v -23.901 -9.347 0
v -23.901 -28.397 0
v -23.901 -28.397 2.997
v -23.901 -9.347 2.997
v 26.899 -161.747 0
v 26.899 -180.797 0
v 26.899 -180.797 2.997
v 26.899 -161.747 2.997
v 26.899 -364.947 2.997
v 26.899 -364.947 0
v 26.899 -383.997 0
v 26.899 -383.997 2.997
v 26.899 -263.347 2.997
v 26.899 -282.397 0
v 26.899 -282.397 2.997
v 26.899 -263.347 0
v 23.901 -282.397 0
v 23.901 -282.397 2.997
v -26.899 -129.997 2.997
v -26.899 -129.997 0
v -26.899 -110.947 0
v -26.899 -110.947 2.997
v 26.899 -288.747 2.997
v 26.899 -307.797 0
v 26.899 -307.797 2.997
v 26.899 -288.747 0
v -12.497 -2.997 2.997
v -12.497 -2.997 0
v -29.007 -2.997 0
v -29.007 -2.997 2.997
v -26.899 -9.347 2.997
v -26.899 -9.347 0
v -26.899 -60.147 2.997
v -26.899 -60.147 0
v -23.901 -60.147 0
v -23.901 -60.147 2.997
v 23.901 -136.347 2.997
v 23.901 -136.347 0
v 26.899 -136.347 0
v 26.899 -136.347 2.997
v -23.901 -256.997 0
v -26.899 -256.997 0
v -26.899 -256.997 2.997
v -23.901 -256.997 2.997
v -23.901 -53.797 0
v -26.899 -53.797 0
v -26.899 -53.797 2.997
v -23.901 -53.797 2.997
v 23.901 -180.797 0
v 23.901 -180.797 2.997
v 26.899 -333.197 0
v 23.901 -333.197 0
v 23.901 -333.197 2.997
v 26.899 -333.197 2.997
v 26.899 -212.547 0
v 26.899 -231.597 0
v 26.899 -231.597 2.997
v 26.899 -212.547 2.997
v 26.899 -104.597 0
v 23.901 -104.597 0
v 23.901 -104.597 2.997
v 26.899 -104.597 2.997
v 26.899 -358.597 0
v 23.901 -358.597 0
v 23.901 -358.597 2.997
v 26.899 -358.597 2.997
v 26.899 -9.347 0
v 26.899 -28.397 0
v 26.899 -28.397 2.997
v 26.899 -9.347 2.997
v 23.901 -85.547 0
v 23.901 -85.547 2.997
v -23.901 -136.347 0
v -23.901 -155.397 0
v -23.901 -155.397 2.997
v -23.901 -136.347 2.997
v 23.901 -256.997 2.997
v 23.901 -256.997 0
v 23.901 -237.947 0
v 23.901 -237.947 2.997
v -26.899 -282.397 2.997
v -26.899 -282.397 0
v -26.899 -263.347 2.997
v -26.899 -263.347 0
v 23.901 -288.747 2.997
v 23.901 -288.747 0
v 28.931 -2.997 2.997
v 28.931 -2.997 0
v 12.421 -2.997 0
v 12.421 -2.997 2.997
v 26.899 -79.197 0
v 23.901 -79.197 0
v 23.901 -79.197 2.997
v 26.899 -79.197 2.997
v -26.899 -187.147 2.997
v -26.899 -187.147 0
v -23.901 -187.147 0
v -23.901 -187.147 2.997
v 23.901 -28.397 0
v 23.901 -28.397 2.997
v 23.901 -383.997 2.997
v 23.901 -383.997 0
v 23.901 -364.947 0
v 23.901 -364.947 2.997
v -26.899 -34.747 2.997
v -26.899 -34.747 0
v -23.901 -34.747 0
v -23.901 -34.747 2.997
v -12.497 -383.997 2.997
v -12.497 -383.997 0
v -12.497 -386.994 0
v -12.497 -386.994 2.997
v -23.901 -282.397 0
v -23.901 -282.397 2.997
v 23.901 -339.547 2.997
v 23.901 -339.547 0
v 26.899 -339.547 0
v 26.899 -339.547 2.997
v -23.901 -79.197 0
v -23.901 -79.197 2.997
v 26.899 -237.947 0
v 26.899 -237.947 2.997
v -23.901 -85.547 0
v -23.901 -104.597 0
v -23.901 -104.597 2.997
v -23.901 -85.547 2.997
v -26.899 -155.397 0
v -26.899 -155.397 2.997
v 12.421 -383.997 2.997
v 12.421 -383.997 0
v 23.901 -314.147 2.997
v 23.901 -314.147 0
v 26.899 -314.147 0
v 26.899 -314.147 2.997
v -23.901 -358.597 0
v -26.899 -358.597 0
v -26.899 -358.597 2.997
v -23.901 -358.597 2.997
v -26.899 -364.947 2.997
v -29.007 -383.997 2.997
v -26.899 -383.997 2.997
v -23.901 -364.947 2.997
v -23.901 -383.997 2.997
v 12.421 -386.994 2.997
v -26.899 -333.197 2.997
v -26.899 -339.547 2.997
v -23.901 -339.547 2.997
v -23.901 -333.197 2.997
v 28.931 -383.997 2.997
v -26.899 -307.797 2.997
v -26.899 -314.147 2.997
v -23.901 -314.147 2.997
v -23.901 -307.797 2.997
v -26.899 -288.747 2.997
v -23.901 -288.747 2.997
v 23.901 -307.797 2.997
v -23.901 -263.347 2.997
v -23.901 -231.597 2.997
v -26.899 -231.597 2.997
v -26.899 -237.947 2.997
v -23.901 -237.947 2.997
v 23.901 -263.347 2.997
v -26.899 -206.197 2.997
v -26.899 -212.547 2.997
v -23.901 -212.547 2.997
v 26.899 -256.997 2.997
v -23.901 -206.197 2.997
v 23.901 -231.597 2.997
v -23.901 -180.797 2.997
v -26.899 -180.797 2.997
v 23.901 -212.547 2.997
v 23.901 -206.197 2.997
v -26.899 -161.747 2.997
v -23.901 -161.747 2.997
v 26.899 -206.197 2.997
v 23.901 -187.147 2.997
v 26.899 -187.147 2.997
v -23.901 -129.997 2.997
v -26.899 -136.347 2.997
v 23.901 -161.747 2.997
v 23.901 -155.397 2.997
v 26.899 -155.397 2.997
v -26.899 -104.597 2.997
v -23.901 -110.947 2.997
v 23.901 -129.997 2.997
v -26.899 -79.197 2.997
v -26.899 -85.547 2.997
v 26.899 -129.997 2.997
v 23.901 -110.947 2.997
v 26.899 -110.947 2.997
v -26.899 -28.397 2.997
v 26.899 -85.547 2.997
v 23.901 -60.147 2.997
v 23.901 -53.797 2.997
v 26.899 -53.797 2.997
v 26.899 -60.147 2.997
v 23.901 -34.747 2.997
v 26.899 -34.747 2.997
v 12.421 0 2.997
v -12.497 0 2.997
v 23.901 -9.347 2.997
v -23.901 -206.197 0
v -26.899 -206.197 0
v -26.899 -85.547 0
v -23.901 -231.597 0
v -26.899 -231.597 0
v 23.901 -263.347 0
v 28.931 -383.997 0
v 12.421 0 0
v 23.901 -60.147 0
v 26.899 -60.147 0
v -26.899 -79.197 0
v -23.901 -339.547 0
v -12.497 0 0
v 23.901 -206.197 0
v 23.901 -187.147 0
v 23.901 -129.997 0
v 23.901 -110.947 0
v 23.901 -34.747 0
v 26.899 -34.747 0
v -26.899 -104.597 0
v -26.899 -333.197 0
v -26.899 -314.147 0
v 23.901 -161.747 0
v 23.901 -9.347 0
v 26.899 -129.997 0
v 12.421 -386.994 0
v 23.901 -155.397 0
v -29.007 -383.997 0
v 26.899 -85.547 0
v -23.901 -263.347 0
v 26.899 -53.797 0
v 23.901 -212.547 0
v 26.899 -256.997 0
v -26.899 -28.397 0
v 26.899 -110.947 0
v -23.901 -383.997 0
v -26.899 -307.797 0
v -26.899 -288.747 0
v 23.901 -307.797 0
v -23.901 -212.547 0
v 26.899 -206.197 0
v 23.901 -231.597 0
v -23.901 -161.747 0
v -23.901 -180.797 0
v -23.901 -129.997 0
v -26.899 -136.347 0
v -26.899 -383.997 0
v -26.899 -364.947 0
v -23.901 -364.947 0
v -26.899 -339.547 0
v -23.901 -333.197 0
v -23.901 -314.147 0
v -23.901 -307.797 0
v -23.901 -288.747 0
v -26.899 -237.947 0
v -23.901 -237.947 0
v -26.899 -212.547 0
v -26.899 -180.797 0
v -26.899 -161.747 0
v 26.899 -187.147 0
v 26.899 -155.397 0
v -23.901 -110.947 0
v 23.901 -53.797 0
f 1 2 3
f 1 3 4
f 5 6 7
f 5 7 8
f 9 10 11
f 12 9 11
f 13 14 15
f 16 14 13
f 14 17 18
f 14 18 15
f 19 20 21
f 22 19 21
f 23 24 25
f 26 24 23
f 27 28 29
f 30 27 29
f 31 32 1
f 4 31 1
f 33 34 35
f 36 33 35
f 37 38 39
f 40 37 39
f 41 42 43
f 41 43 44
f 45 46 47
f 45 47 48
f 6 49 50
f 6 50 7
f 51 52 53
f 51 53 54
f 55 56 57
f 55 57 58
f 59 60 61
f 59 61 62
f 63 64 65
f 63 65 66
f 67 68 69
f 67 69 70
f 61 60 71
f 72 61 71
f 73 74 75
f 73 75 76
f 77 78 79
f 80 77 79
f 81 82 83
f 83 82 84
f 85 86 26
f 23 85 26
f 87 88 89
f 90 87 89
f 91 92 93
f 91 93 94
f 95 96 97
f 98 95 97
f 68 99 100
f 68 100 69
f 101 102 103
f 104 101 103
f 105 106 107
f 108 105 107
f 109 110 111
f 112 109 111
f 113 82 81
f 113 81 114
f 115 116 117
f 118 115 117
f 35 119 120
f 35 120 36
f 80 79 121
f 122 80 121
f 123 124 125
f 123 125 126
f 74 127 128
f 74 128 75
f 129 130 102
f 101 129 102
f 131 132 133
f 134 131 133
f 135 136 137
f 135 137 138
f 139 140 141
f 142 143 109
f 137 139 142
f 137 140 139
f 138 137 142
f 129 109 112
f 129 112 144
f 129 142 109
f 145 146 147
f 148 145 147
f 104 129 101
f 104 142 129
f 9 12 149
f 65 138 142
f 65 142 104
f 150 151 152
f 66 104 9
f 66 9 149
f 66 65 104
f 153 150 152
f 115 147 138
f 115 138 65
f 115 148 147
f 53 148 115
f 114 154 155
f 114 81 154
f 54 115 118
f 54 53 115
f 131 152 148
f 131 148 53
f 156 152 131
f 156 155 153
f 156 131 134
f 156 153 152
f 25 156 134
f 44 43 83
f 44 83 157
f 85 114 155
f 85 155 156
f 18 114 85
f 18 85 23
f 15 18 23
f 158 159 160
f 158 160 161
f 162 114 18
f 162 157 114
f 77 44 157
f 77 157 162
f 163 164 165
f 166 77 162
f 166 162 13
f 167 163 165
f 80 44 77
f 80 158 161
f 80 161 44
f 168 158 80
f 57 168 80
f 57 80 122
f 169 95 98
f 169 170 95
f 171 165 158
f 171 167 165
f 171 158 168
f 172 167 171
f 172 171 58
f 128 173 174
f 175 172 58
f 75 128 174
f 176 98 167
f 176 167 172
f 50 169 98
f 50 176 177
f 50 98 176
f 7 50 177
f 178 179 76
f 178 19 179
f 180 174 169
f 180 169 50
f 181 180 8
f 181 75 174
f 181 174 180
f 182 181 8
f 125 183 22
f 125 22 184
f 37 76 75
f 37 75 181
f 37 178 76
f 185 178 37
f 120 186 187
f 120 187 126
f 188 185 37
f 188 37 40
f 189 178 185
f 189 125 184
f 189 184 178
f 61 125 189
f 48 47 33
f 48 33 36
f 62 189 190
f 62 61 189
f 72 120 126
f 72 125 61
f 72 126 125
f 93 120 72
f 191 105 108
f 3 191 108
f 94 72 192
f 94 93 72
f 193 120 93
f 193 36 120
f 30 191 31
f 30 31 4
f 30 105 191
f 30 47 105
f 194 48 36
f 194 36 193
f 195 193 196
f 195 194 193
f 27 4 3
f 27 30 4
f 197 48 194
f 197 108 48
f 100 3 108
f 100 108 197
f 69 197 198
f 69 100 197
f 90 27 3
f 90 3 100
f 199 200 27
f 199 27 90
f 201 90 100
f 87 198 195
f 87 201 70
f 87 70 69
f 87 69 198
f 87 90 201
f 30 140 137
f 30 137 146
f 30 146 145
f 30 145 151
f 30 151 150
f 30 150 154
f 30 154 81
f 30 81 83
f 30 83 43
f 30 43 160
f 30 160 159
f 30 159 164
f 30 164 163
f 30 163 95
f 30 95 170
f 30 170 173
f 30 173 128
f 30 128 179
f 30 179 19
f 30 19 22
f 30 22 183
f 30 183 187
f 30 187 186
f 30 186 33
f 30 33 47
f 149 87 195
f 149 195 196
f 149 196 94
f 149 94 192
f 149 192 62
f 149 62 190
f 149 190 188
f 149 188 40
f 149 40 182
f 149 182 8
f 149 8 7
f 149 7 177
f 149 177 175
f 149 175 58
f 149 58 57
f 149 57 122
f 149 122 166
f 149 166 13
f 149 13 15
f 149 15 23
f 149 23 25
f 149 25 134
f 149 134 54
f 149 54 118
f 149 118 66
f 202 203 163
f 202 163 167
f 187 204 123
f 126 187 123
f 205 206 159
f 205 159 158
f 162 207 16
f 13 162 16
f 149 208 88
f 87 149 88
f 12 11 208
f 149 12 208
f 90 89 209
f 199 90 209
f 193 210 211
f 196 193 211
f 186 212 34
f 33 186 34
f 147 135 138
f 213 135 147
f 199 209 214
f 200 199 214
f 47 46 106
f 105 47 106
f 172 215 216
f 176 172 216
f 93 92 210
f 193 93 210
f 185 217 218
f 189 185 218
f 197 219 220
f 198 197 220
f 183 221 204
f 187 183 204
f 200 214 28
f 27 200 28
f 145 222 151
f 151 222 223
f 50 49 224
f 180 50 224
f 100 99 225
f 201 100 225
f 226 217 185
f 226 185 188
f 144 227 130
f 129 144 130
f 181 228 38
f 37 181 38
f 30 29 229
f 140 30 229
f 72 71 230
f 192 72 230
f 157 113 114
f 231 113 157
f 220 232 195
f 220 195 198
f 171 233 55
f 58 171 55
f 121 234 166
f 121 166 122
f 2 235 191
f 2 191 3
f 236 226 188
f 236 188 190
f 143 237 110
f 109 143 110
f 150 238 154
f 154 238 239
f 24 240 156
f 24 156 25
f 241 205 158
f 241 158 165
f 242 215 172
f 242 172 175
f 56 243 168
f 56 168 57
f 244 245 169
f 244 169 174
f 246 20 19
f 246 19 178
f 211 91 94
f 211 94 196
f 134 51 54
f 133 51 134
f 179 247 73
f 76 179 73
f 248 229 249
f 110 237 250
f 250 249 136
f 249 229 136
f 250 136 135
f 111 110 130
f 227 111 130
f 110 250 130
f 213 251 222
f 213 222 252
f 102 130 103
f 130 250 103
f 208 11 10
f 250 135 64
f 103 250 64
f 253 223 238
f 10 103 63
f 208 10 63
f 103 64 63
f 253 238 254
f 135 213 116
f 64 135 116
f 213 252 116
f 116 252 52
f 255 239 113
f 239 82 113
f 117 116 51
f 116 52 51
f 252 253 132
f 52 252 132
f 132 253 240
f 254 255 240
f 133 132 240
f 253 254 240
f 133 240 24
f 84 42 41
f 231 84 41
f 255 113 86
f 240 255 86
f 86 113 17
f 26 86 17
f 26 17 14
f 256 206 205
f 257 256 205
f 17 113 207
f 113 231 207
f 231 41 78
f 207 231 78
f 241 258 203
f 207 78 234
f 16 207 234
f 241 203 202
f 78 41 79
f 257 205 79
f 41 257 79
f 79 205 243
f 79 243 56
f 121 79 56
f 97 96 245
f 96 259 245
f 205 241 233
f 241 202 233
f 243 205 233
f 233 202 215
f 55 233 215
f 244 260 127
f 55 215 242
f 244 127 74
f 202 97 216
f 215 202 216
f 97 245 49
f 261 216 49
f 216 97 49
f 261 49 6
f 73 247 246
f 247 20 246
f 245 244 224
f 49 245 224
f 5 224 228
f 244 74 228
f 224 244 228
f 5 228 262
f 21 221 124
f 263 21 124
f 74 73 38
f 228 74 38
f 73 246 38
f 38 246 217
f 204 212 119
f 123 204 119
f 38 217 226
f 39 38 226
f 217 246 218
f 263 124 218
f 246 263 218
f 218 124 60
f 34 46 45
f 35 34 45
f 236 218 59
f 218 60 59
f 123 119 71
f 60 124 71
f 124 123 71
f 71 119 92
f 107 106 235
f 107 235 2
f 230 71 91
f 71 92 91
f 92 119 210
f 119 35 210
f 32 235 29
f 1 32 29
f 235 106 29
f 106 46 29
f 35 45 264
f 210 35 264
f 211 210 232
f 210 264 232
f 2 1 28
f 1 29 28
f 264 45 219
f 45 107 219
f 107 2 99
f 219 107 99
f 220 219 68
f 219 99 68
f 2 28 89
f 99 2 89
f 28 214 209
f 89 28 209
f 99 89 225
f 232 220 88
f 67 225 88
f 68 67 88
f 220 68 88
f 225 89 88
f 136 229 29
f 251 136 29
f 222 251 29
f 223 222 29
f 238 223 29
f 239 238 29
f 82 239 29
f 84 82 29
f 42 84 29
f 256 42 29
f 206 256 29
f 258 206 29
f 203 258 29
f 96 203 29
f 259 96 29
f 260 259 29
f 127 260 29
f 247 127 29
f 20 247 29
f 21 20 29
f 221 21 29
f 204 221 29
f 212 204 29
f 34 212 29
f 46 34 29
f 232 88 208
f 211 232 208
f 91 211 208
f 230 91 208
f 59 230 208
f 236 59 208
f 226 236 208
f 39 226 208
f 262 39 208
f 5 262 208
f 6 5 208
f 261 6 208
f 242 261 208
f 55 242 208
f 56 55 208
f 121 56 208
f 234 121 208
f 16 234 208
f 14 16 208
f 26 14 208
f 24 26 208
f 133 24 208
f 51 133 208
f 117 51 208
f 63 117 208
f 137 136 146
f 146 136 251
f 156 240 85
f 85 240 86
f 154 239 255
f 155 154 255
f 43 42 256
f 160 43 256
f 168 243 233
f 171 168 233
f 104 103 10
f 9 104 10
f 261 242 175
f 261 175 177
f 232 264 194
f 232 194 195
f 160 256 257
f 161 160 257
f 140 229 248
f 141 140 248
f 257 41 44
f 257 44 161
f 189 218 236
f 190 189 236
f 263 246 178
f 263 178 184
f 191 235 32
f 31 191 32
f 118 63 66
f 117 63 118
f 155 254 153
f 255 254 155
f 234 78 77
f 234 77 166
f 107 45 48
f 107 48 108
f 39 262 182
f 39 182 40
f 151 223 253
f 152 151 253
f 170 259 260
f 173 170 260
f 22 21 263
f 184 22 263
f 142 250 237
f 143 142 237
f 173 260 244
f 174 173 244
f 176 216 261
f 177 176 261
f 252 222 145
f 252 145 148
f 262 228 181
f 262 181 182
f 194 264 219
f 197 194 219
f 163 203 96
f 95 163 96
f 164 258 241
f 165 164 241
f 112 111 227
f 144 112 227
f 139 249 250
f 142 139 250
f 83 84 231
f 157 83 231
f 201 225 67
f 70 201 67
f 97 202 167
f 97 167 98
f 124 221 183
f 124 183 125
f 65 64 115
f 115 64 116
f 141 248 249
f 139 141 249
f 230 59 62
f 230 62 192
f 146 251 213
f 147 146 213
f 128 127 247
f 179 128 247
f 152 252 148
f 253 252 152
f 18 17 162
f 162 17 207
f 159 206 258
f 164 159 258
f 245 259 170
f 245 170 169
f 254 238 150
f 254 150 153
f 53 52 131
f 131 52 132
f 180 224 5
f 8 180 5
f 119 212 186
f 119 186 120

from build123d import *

# Parameters (mm, degrees)
SKETCH1_W           = 2.9972
SKETCH1_H           = 19.05
BOSS_EXTRUDE1_DEPTH = 2.9972


with BuildPart() as part:
    # Sketch1 → Boss-Extrude1 (new body)
    with BuildSketch(Plane.XY):
        Polygon((-12.4968, 0), (-12.4968, -2.9972), (-29.0068, -2.9972), (-29.0068, -383.9972), (-26.8986, -383.9972), (-26.8986, -364.9472), (-23.9014, -364.9472), (-23.9014, -383.9972), (-12.4968, -383.9972), (-12.4968, -386.9944), (12.4206, -386.9944), (12.4206, -383.9972), (23.9014, -383.9972), (23.9014, -364.9472), (26.8986, -364.9472), (26.8986, -383.9972), (28.9306, -383.9972), (28.9306, -2.9972), (12.4206, -2.9972), (12.4206, 0), align=None)
        with Locations((-25.4, -349.0722)):
            Rectangle(SKETCH1_W, SKETCH1_H, mode=Mode.SUBTRACT)
        with Locations((-25.4, -323.6722)):
            Rectangle(SKETCH1_W, SKETCH1_H, mode=Mode.SUBTRACT)
        with Locations((-25.4, -298.2722)):
            Rectangle(SKETCH1_W, SKETCH1_H, mode=Mode.SUBTRACT)
        with Locations((-25.4, -272.8722)):
            Rectangle(SKETCH1_W, SKETCH1_H, mode=Mode.SUBTRACT)
        with Locations((-25.4, -247.4722)):
            Rectangle(SKETCH1_W, SKETCH1_H, mode=Mode.SUBTRACT)
        with Locations((-25.4, -222.0722)):
            Rectangle(SKETCH1_W, SKETCH1_H, mode=Mode.SUBTRACT)
        with Locations((-25.4, -196.6722)):
            Rectangle(SKETCH1_W, SKETCH1_H, mode=Mode.SUBTRACT)
        with Locations((25.4, -349.0722)):
            Rectangle(SKETCH1_W, SKETCH1_H, mode=Mode.SUBTRACT)
        with Locations((25.4, -323.6722)):
            Rectangle(SKETCH1_W, SKETCH1_H, mode=Mode.SUBTRACT)
        with Locations((25.4, -298.2722)):
            Rectangle(SKETCH1_W, SKETCH1_H, mode=Mode.SUBTRACT)
        with Locations((25.4, -272.8722)):
            Rectangle(SKETCH1_W, SKETCH1_H, mode=Mode.SUBTRACT)
        with Locations((25.4, -247.4722)):
            Rectangle(SKETCH1_W, SKETCH1_H, mode=Mode.SUBTRACT)
        with Locations((25.4, -222.0722)):
            Rectangle(SKETCH1_W, SKETCH1_H, mode=Mode.SUBTRACT)
        with Locations((25.4, -196.6722)):
            Rectangle(SKETCH1_W, SKETCH1_H, mode=Mode.SUBTRACT)
        with Locations((-25.4, -171.2722)):
            Rectangle(SKETCH1_W, SKETCH1_H, mode=Mode.SUBTRACT)
        with Locations((-25.4, -145.8722)):
            Rectangle(SKETCH1_W, SKETCH1_H, mode=Mode.SUBTRACT)
        with Locations((-25.4, -120.4722)):
            Rectangle(SKETCH1_W, SKETCH1_H, mode=Mode.SUBTRACT)
        with Locations((-25.4, -95.0722)):
            Rectangle(SKETCH1_W, SKETCH1_H, mode=Mode.SUBTRACT)
        with Locations((-25.4, -69.6722)):
            Rectangle(SKETCH1_W, SKETCH1_H, mode=Mode.SUBTRACT)
        with Locations((-25.4, -44.2722)):
            Rectangle(SKETCH1_W, SKETCH1_H, mode=Mode.SUBTRACT)
        with Locations((-25.4, -18.8722)):
            Rectangle(SKETCH1_W, SKETCH1_H, mode=Mode.SUBTRACT)
        with Locations((25.4, -171.2722)):
            Rectangle(SKETCH1_W, SKETCH1_H, mode=Mode.SUBTRACT)
        with Locations((25.4, -145.8722)):
            Rectangle(SKETCH1_W, SKETCH1_H, mode=Mode.SUBTRACT)
        with Locations((25.4, -120.4722)):
            Rectangle(SKETCH1_W, SKETCH1_H, mode=Mode.SUBTRACT)
        with Locations((25.4, -95.0722)):
            Rectangle(SKETCH1_W, SKETCH1_H, mode=Mode.SUBTRACT)
        with Locations((25.4, -69.6722)):
            Rectangle(SKETCH1_W, SKETCH1_H, mode=Mode.SUBTRACT)
        with Locations((25.4, -44.2722)):
            Rectangle(SKETCH1_W, SKETCH1_H, mode=Mode.SUBTRACT)
        with Locations((25.4, -18.8722)):
            Rectangle(SKETCH1_W, SKETCH1_H, mode=Mode.SUBTRACT)
    extrude(amount=BOSS_EXTRUDE1_DEPTH)


solid = part.part
